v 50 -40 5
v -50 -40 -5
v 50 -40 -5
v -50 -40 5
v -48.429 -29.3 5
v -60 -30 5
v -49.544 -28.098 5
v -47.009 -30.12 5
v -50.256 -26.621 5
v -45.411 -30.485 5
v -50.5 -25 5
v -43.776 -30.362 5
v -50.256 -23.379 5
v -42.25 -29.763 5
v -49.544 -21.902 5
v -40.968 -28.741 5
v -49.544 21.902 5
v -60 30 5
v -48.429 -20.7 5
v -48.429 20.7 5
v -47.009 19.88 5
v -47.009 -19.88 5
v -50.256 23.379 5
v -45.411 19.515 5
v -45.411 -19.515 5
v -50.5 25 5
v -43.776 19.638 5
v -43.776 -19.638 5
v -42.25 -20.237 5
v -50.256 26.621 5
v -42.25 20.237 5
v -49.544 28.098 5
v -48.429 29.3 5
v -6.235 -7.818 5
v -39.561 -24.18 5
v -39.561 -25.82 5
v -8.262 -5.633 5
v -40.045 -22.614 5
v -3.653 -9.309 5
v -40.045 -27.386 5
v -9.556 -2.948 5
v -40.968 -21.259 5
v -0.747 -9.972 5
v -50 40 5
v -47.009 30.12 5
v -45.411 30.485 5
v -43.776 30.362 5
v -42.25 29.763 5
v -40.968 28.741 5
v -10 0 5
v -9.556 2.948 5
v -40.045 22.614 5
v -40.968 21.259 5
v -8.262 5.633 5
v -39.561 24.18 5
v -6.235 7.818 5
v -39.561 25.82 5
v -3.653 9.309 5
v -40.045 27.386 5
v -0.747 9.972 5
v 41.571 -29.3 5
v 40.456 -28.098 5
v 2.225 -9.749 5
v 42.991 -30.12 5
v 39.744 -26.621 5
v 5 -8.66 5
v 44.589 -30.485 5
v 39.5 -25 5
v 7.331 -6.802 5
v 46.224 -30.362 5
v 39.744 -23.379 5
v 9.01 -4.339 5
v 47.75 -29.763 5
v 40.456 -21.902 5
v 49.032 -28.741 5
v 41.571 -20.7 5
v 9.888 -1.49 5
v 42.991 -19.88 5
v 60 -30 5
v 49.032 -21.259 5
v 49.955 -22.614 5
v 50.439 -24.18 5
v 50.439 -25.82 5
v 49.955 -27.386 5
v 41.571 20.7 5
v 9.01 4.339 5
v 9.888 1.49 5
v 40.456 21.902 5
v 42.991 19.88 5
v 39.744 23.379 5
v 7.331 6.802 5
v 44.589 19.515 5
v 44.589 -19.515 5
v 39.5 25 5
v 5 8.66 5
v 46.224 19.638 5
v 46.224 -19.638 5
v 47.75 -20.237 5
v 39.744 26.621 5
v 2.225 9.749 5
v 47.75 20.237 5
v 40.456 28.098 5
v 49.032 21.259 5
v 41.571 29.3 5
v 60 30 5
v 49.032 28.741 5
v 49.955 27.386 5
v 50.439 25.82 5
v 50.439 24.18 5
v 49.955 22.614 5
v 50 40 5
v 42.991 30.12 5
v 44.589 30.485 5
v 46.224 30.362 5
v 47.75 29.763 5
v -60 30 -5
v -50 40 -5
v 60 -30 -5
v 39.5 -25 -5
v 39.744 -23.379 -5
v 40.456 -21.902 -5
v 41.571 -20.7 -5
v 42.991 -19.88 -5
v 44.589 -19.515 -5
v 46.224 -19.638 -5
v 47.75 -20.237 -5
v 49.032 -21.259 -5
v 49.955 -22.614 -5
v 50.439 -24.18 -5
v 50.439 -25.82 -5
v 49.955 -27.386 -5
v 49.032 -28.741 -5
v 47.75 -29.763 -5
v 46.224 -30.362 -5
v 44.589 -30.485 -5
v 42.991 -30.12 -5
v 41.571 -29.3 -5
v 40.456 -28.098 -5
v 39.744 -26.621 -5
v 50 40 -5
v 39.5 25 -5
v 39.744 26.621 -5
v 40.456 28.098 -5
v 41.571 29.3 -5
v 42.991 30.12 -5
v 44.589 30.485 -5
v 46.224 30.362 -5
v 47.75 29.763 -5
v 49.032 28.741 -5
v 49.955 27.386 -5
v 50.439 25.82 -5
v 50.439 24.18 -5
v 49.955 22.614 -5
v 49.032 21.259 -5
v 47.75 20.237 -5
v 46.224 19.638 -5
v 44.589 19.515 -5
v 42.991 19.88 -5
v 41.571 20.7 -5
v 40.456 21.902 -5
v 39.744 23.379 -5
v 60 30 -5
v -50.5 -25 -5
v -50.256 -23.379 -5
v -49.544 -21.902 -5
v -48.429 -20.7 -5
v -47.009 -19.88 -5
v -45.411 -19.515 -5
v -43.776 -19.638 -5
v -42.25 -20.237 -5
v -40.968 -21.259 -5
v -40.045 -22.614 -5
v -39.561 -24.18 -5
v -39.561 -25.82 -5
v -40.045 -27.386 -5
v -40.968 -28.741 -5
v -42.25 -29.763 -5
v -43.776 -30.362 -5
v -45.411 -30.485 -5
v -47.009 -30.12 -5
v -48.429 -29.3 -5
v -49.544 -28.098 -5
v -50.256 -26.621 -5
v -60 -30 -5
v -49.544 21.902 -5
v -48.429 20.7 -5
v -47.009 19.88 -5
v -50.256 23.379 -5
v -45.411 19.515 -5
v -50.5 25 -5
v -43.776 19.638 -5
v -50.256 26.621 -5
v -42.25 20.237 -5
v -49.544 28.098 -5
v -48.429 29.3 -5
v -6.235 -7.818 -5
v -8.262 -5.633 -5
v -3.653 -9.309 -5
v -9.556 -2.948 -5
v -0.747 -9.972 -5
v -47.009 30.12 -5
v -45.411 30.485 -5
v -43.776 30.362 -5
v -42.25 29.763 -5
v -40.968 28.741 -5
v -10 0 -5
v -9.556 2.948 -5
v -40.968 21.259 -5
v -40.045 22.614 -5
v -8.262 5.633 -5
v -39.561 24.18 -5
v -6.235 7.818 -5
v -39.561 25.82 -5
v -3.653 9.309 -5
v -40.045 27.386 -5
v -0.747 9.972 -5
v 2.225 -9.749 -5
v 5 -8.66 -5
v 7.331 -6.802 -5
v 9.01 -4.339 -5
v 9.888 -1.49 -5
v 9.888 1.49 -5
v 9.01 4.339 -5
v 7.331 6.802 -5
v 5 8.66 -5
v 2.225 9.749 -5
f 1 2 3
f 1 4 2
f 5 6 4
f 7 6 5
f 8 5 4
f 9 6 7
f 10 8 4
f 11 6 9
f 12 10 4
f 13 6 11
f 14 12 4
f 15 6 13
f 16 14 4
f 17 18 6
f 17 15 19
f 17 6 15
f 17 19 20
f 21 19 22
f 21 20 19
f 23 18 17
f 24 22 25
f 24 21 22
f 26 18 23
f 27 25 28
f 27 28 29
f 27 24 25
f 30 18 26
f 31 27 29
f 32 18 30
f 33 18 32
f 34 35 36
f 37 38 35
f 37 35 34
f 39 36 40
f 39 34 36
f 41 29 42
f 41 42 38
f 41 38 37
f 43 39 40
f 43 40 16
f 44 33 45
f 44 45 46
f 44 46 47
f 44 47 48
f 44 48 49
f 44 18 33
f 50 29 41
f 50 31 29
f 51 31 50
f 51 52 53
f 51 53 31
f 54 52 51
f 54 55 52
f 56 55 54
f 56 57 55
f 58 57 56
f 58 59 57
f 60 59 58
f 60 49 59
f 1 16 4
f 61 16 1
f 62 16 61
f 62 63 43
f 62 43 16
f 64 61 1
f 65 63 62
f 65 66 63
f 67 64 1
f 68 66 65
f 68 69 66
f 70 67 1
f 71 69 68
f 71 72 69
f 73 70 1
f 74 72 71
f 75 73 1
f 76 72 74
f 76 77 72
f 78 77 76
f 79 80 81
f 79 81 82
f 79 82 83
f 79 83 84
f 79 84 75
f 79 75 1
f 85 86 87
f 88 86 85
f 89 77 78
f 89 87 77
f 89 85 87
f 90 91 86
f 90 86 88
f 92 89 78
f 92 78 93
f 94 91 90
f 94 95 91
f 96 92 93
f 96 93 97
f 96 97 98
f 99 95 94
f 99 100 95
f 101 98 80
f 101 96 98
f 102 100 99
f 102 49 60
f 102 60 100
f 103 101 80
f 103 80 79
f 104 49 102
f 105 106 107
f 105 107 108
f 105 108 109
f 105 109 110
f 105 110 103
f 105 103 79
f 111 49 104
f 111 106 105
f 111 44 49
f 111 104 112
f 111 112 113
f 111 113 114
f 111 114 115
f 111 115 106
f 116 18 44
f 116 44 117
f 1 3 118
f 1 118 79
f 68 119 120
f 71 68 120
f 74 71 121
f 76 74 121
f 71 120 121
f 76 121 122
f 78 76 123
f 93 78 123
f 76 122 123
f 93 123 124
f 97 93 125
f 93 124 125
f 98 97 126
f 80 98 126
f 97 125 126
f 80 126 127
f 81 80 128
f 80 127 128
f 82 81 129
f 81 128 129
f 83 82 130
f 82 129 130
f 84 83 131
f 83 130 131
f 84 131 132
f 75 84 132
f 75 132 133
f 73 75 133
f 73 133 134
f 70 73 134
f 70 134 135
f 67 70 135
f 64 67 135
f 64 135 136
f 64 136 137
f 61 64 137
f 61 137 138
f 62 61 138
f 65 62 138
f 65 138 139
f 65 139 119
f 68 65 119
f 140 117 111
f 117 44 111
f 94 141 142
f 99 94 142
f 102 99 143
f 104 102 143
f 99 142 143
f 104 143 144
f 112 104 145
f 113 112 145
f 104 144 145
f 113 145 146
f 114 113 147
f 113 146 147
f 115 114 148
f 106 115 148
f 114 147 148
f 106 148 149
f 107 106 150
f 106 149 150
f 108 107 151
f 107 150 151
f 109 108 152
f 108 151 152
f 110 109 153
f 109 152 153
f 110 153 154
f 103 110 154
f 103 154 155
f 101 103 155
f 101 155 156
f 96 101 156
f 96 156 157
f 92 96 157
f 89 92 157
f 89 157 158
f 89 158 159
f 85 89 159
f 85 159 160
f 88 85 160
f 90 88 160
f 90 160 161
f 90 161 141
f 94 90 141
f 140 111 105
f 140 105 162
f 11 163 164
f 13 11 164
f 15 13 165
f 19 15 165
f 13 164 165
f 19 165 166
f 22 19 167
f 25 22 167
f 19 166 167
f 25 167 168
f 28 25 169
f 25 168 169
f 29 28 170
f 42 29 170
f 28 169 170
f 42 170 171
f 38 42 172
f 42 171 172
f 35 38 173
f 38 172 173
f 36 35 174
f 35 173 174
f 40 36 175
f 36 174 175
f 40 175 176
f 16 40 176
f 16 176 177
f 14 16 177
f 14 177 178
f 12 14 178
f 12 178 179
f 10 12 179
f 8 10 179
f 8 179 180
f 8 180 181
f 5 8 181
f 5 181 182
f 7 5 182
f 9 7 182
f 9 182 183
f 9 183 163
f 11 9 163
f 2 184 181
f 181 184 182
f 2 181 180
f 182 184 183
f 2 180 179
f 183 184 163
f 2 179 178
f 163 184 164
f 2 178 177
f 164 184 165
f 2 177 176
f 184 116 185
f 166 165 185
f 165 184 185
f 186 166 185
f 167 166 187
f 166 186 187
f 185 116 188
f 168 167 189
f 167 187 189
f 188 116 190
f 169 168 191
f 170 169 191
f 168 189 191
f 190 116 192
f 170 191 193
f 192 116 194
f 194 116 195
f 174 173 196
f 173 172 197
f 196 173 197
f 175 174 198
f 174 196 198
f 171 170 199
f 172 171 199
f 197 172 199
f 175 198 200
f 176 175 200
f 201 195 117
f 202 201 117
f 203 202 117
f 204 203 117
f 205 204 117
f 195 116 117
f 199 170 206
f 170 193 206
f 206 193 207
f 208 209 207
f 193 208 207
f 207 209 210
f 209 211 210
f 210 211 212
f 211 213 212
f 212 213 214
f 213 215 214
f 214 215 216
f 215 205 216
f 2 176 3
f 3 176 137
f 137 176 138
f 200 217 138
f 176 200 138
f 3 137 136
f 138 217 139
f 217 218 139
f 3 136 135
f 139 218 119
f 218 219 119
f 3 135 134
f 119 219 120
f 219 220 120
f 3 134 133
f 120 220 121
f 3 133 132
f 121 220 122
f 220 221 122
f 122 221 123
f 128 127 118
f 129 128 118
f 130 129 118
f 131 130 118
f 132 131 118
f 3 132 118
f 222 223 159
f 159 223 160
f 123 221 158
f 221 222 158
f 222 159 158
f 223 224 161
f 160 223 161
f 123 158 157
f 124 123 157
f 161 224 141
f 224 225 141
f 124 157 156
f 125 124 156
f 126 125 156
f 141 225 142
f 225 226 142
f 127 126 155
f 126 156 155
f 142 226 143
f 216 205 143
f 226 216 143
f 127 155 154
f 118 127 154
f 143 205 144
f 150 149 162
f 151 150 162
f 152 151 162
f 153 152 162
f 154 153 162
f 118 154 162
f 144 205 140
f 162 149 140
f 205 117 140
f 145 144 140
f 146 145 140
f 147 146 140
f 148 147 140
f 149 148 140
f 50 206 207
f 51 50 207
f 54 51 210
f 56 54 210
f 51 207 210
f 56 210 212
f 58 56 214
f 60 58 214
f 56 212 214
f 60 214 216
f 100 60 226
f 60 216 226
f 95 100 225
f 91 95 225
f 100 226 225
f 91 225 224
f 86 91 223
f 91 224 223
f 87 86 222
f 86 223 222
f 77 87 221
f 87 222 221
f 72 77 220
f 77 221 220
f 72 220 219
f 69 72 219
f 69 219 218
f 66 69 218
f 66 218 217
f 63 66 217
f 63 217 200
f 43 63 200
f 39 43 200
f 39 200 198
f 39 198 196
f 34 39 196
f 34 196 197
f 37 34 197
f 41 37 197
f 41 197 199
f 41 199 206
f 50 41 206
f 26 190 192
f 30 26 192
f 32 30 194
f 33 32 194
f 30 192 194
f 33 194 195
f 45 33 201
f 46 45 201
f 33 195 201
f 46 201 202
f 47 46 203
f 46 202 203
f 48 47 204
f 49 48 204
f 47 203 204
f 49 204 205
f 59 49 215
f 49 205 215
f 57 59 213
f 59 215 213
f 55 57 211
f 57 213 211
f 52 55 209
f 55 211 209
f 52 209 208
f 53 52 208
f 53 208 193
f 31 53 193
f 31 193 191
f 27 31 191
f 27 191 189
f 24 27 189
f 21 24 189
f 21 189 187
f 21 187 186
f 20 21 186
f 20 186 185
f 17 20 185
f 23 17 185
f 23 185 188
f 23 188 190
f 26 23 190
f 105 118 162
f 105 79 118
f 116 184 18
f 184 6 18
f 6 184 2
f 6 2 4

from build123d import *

# Parameters (mm, degrees)
F0_W     = 120
F0_H     = 80
F1_DEPTH = 5
F3_D     = 11
F4_D     = 20
F5_SIZE  = 10


with BuildPart() as f1:
    # F0 (on Top) → F1 (new body, symmetric)
    with BuildSketch(Plane.XY):
        Rectangle(F0_W, F0_H)
    extrude(amount=F1_DEPTH, both=True)

    # F3 (through all)
    with Locations(Plane.XY.offset(5)):
        with Locations((-45, 25), (45, 25), (45, -25), (-45, -25)):
            Hole(F3_D / 2)

    # F4 (through all)
    with Locations(Plane.XY.offset(5)):
        with Locations((0, 0)):
            Hole(F4_D / 2)

    # F5
    f5_edges = [f1.edges().sort_by_distance(p)[0] for p in [
        (-60, -40, 0),
        (-60, 40, 0),
        (60, -40, 0),
        (60, 40, 0),
    ]]
    chamfer(f5_edges, length=F5_SIZE)


solid = f1.part
